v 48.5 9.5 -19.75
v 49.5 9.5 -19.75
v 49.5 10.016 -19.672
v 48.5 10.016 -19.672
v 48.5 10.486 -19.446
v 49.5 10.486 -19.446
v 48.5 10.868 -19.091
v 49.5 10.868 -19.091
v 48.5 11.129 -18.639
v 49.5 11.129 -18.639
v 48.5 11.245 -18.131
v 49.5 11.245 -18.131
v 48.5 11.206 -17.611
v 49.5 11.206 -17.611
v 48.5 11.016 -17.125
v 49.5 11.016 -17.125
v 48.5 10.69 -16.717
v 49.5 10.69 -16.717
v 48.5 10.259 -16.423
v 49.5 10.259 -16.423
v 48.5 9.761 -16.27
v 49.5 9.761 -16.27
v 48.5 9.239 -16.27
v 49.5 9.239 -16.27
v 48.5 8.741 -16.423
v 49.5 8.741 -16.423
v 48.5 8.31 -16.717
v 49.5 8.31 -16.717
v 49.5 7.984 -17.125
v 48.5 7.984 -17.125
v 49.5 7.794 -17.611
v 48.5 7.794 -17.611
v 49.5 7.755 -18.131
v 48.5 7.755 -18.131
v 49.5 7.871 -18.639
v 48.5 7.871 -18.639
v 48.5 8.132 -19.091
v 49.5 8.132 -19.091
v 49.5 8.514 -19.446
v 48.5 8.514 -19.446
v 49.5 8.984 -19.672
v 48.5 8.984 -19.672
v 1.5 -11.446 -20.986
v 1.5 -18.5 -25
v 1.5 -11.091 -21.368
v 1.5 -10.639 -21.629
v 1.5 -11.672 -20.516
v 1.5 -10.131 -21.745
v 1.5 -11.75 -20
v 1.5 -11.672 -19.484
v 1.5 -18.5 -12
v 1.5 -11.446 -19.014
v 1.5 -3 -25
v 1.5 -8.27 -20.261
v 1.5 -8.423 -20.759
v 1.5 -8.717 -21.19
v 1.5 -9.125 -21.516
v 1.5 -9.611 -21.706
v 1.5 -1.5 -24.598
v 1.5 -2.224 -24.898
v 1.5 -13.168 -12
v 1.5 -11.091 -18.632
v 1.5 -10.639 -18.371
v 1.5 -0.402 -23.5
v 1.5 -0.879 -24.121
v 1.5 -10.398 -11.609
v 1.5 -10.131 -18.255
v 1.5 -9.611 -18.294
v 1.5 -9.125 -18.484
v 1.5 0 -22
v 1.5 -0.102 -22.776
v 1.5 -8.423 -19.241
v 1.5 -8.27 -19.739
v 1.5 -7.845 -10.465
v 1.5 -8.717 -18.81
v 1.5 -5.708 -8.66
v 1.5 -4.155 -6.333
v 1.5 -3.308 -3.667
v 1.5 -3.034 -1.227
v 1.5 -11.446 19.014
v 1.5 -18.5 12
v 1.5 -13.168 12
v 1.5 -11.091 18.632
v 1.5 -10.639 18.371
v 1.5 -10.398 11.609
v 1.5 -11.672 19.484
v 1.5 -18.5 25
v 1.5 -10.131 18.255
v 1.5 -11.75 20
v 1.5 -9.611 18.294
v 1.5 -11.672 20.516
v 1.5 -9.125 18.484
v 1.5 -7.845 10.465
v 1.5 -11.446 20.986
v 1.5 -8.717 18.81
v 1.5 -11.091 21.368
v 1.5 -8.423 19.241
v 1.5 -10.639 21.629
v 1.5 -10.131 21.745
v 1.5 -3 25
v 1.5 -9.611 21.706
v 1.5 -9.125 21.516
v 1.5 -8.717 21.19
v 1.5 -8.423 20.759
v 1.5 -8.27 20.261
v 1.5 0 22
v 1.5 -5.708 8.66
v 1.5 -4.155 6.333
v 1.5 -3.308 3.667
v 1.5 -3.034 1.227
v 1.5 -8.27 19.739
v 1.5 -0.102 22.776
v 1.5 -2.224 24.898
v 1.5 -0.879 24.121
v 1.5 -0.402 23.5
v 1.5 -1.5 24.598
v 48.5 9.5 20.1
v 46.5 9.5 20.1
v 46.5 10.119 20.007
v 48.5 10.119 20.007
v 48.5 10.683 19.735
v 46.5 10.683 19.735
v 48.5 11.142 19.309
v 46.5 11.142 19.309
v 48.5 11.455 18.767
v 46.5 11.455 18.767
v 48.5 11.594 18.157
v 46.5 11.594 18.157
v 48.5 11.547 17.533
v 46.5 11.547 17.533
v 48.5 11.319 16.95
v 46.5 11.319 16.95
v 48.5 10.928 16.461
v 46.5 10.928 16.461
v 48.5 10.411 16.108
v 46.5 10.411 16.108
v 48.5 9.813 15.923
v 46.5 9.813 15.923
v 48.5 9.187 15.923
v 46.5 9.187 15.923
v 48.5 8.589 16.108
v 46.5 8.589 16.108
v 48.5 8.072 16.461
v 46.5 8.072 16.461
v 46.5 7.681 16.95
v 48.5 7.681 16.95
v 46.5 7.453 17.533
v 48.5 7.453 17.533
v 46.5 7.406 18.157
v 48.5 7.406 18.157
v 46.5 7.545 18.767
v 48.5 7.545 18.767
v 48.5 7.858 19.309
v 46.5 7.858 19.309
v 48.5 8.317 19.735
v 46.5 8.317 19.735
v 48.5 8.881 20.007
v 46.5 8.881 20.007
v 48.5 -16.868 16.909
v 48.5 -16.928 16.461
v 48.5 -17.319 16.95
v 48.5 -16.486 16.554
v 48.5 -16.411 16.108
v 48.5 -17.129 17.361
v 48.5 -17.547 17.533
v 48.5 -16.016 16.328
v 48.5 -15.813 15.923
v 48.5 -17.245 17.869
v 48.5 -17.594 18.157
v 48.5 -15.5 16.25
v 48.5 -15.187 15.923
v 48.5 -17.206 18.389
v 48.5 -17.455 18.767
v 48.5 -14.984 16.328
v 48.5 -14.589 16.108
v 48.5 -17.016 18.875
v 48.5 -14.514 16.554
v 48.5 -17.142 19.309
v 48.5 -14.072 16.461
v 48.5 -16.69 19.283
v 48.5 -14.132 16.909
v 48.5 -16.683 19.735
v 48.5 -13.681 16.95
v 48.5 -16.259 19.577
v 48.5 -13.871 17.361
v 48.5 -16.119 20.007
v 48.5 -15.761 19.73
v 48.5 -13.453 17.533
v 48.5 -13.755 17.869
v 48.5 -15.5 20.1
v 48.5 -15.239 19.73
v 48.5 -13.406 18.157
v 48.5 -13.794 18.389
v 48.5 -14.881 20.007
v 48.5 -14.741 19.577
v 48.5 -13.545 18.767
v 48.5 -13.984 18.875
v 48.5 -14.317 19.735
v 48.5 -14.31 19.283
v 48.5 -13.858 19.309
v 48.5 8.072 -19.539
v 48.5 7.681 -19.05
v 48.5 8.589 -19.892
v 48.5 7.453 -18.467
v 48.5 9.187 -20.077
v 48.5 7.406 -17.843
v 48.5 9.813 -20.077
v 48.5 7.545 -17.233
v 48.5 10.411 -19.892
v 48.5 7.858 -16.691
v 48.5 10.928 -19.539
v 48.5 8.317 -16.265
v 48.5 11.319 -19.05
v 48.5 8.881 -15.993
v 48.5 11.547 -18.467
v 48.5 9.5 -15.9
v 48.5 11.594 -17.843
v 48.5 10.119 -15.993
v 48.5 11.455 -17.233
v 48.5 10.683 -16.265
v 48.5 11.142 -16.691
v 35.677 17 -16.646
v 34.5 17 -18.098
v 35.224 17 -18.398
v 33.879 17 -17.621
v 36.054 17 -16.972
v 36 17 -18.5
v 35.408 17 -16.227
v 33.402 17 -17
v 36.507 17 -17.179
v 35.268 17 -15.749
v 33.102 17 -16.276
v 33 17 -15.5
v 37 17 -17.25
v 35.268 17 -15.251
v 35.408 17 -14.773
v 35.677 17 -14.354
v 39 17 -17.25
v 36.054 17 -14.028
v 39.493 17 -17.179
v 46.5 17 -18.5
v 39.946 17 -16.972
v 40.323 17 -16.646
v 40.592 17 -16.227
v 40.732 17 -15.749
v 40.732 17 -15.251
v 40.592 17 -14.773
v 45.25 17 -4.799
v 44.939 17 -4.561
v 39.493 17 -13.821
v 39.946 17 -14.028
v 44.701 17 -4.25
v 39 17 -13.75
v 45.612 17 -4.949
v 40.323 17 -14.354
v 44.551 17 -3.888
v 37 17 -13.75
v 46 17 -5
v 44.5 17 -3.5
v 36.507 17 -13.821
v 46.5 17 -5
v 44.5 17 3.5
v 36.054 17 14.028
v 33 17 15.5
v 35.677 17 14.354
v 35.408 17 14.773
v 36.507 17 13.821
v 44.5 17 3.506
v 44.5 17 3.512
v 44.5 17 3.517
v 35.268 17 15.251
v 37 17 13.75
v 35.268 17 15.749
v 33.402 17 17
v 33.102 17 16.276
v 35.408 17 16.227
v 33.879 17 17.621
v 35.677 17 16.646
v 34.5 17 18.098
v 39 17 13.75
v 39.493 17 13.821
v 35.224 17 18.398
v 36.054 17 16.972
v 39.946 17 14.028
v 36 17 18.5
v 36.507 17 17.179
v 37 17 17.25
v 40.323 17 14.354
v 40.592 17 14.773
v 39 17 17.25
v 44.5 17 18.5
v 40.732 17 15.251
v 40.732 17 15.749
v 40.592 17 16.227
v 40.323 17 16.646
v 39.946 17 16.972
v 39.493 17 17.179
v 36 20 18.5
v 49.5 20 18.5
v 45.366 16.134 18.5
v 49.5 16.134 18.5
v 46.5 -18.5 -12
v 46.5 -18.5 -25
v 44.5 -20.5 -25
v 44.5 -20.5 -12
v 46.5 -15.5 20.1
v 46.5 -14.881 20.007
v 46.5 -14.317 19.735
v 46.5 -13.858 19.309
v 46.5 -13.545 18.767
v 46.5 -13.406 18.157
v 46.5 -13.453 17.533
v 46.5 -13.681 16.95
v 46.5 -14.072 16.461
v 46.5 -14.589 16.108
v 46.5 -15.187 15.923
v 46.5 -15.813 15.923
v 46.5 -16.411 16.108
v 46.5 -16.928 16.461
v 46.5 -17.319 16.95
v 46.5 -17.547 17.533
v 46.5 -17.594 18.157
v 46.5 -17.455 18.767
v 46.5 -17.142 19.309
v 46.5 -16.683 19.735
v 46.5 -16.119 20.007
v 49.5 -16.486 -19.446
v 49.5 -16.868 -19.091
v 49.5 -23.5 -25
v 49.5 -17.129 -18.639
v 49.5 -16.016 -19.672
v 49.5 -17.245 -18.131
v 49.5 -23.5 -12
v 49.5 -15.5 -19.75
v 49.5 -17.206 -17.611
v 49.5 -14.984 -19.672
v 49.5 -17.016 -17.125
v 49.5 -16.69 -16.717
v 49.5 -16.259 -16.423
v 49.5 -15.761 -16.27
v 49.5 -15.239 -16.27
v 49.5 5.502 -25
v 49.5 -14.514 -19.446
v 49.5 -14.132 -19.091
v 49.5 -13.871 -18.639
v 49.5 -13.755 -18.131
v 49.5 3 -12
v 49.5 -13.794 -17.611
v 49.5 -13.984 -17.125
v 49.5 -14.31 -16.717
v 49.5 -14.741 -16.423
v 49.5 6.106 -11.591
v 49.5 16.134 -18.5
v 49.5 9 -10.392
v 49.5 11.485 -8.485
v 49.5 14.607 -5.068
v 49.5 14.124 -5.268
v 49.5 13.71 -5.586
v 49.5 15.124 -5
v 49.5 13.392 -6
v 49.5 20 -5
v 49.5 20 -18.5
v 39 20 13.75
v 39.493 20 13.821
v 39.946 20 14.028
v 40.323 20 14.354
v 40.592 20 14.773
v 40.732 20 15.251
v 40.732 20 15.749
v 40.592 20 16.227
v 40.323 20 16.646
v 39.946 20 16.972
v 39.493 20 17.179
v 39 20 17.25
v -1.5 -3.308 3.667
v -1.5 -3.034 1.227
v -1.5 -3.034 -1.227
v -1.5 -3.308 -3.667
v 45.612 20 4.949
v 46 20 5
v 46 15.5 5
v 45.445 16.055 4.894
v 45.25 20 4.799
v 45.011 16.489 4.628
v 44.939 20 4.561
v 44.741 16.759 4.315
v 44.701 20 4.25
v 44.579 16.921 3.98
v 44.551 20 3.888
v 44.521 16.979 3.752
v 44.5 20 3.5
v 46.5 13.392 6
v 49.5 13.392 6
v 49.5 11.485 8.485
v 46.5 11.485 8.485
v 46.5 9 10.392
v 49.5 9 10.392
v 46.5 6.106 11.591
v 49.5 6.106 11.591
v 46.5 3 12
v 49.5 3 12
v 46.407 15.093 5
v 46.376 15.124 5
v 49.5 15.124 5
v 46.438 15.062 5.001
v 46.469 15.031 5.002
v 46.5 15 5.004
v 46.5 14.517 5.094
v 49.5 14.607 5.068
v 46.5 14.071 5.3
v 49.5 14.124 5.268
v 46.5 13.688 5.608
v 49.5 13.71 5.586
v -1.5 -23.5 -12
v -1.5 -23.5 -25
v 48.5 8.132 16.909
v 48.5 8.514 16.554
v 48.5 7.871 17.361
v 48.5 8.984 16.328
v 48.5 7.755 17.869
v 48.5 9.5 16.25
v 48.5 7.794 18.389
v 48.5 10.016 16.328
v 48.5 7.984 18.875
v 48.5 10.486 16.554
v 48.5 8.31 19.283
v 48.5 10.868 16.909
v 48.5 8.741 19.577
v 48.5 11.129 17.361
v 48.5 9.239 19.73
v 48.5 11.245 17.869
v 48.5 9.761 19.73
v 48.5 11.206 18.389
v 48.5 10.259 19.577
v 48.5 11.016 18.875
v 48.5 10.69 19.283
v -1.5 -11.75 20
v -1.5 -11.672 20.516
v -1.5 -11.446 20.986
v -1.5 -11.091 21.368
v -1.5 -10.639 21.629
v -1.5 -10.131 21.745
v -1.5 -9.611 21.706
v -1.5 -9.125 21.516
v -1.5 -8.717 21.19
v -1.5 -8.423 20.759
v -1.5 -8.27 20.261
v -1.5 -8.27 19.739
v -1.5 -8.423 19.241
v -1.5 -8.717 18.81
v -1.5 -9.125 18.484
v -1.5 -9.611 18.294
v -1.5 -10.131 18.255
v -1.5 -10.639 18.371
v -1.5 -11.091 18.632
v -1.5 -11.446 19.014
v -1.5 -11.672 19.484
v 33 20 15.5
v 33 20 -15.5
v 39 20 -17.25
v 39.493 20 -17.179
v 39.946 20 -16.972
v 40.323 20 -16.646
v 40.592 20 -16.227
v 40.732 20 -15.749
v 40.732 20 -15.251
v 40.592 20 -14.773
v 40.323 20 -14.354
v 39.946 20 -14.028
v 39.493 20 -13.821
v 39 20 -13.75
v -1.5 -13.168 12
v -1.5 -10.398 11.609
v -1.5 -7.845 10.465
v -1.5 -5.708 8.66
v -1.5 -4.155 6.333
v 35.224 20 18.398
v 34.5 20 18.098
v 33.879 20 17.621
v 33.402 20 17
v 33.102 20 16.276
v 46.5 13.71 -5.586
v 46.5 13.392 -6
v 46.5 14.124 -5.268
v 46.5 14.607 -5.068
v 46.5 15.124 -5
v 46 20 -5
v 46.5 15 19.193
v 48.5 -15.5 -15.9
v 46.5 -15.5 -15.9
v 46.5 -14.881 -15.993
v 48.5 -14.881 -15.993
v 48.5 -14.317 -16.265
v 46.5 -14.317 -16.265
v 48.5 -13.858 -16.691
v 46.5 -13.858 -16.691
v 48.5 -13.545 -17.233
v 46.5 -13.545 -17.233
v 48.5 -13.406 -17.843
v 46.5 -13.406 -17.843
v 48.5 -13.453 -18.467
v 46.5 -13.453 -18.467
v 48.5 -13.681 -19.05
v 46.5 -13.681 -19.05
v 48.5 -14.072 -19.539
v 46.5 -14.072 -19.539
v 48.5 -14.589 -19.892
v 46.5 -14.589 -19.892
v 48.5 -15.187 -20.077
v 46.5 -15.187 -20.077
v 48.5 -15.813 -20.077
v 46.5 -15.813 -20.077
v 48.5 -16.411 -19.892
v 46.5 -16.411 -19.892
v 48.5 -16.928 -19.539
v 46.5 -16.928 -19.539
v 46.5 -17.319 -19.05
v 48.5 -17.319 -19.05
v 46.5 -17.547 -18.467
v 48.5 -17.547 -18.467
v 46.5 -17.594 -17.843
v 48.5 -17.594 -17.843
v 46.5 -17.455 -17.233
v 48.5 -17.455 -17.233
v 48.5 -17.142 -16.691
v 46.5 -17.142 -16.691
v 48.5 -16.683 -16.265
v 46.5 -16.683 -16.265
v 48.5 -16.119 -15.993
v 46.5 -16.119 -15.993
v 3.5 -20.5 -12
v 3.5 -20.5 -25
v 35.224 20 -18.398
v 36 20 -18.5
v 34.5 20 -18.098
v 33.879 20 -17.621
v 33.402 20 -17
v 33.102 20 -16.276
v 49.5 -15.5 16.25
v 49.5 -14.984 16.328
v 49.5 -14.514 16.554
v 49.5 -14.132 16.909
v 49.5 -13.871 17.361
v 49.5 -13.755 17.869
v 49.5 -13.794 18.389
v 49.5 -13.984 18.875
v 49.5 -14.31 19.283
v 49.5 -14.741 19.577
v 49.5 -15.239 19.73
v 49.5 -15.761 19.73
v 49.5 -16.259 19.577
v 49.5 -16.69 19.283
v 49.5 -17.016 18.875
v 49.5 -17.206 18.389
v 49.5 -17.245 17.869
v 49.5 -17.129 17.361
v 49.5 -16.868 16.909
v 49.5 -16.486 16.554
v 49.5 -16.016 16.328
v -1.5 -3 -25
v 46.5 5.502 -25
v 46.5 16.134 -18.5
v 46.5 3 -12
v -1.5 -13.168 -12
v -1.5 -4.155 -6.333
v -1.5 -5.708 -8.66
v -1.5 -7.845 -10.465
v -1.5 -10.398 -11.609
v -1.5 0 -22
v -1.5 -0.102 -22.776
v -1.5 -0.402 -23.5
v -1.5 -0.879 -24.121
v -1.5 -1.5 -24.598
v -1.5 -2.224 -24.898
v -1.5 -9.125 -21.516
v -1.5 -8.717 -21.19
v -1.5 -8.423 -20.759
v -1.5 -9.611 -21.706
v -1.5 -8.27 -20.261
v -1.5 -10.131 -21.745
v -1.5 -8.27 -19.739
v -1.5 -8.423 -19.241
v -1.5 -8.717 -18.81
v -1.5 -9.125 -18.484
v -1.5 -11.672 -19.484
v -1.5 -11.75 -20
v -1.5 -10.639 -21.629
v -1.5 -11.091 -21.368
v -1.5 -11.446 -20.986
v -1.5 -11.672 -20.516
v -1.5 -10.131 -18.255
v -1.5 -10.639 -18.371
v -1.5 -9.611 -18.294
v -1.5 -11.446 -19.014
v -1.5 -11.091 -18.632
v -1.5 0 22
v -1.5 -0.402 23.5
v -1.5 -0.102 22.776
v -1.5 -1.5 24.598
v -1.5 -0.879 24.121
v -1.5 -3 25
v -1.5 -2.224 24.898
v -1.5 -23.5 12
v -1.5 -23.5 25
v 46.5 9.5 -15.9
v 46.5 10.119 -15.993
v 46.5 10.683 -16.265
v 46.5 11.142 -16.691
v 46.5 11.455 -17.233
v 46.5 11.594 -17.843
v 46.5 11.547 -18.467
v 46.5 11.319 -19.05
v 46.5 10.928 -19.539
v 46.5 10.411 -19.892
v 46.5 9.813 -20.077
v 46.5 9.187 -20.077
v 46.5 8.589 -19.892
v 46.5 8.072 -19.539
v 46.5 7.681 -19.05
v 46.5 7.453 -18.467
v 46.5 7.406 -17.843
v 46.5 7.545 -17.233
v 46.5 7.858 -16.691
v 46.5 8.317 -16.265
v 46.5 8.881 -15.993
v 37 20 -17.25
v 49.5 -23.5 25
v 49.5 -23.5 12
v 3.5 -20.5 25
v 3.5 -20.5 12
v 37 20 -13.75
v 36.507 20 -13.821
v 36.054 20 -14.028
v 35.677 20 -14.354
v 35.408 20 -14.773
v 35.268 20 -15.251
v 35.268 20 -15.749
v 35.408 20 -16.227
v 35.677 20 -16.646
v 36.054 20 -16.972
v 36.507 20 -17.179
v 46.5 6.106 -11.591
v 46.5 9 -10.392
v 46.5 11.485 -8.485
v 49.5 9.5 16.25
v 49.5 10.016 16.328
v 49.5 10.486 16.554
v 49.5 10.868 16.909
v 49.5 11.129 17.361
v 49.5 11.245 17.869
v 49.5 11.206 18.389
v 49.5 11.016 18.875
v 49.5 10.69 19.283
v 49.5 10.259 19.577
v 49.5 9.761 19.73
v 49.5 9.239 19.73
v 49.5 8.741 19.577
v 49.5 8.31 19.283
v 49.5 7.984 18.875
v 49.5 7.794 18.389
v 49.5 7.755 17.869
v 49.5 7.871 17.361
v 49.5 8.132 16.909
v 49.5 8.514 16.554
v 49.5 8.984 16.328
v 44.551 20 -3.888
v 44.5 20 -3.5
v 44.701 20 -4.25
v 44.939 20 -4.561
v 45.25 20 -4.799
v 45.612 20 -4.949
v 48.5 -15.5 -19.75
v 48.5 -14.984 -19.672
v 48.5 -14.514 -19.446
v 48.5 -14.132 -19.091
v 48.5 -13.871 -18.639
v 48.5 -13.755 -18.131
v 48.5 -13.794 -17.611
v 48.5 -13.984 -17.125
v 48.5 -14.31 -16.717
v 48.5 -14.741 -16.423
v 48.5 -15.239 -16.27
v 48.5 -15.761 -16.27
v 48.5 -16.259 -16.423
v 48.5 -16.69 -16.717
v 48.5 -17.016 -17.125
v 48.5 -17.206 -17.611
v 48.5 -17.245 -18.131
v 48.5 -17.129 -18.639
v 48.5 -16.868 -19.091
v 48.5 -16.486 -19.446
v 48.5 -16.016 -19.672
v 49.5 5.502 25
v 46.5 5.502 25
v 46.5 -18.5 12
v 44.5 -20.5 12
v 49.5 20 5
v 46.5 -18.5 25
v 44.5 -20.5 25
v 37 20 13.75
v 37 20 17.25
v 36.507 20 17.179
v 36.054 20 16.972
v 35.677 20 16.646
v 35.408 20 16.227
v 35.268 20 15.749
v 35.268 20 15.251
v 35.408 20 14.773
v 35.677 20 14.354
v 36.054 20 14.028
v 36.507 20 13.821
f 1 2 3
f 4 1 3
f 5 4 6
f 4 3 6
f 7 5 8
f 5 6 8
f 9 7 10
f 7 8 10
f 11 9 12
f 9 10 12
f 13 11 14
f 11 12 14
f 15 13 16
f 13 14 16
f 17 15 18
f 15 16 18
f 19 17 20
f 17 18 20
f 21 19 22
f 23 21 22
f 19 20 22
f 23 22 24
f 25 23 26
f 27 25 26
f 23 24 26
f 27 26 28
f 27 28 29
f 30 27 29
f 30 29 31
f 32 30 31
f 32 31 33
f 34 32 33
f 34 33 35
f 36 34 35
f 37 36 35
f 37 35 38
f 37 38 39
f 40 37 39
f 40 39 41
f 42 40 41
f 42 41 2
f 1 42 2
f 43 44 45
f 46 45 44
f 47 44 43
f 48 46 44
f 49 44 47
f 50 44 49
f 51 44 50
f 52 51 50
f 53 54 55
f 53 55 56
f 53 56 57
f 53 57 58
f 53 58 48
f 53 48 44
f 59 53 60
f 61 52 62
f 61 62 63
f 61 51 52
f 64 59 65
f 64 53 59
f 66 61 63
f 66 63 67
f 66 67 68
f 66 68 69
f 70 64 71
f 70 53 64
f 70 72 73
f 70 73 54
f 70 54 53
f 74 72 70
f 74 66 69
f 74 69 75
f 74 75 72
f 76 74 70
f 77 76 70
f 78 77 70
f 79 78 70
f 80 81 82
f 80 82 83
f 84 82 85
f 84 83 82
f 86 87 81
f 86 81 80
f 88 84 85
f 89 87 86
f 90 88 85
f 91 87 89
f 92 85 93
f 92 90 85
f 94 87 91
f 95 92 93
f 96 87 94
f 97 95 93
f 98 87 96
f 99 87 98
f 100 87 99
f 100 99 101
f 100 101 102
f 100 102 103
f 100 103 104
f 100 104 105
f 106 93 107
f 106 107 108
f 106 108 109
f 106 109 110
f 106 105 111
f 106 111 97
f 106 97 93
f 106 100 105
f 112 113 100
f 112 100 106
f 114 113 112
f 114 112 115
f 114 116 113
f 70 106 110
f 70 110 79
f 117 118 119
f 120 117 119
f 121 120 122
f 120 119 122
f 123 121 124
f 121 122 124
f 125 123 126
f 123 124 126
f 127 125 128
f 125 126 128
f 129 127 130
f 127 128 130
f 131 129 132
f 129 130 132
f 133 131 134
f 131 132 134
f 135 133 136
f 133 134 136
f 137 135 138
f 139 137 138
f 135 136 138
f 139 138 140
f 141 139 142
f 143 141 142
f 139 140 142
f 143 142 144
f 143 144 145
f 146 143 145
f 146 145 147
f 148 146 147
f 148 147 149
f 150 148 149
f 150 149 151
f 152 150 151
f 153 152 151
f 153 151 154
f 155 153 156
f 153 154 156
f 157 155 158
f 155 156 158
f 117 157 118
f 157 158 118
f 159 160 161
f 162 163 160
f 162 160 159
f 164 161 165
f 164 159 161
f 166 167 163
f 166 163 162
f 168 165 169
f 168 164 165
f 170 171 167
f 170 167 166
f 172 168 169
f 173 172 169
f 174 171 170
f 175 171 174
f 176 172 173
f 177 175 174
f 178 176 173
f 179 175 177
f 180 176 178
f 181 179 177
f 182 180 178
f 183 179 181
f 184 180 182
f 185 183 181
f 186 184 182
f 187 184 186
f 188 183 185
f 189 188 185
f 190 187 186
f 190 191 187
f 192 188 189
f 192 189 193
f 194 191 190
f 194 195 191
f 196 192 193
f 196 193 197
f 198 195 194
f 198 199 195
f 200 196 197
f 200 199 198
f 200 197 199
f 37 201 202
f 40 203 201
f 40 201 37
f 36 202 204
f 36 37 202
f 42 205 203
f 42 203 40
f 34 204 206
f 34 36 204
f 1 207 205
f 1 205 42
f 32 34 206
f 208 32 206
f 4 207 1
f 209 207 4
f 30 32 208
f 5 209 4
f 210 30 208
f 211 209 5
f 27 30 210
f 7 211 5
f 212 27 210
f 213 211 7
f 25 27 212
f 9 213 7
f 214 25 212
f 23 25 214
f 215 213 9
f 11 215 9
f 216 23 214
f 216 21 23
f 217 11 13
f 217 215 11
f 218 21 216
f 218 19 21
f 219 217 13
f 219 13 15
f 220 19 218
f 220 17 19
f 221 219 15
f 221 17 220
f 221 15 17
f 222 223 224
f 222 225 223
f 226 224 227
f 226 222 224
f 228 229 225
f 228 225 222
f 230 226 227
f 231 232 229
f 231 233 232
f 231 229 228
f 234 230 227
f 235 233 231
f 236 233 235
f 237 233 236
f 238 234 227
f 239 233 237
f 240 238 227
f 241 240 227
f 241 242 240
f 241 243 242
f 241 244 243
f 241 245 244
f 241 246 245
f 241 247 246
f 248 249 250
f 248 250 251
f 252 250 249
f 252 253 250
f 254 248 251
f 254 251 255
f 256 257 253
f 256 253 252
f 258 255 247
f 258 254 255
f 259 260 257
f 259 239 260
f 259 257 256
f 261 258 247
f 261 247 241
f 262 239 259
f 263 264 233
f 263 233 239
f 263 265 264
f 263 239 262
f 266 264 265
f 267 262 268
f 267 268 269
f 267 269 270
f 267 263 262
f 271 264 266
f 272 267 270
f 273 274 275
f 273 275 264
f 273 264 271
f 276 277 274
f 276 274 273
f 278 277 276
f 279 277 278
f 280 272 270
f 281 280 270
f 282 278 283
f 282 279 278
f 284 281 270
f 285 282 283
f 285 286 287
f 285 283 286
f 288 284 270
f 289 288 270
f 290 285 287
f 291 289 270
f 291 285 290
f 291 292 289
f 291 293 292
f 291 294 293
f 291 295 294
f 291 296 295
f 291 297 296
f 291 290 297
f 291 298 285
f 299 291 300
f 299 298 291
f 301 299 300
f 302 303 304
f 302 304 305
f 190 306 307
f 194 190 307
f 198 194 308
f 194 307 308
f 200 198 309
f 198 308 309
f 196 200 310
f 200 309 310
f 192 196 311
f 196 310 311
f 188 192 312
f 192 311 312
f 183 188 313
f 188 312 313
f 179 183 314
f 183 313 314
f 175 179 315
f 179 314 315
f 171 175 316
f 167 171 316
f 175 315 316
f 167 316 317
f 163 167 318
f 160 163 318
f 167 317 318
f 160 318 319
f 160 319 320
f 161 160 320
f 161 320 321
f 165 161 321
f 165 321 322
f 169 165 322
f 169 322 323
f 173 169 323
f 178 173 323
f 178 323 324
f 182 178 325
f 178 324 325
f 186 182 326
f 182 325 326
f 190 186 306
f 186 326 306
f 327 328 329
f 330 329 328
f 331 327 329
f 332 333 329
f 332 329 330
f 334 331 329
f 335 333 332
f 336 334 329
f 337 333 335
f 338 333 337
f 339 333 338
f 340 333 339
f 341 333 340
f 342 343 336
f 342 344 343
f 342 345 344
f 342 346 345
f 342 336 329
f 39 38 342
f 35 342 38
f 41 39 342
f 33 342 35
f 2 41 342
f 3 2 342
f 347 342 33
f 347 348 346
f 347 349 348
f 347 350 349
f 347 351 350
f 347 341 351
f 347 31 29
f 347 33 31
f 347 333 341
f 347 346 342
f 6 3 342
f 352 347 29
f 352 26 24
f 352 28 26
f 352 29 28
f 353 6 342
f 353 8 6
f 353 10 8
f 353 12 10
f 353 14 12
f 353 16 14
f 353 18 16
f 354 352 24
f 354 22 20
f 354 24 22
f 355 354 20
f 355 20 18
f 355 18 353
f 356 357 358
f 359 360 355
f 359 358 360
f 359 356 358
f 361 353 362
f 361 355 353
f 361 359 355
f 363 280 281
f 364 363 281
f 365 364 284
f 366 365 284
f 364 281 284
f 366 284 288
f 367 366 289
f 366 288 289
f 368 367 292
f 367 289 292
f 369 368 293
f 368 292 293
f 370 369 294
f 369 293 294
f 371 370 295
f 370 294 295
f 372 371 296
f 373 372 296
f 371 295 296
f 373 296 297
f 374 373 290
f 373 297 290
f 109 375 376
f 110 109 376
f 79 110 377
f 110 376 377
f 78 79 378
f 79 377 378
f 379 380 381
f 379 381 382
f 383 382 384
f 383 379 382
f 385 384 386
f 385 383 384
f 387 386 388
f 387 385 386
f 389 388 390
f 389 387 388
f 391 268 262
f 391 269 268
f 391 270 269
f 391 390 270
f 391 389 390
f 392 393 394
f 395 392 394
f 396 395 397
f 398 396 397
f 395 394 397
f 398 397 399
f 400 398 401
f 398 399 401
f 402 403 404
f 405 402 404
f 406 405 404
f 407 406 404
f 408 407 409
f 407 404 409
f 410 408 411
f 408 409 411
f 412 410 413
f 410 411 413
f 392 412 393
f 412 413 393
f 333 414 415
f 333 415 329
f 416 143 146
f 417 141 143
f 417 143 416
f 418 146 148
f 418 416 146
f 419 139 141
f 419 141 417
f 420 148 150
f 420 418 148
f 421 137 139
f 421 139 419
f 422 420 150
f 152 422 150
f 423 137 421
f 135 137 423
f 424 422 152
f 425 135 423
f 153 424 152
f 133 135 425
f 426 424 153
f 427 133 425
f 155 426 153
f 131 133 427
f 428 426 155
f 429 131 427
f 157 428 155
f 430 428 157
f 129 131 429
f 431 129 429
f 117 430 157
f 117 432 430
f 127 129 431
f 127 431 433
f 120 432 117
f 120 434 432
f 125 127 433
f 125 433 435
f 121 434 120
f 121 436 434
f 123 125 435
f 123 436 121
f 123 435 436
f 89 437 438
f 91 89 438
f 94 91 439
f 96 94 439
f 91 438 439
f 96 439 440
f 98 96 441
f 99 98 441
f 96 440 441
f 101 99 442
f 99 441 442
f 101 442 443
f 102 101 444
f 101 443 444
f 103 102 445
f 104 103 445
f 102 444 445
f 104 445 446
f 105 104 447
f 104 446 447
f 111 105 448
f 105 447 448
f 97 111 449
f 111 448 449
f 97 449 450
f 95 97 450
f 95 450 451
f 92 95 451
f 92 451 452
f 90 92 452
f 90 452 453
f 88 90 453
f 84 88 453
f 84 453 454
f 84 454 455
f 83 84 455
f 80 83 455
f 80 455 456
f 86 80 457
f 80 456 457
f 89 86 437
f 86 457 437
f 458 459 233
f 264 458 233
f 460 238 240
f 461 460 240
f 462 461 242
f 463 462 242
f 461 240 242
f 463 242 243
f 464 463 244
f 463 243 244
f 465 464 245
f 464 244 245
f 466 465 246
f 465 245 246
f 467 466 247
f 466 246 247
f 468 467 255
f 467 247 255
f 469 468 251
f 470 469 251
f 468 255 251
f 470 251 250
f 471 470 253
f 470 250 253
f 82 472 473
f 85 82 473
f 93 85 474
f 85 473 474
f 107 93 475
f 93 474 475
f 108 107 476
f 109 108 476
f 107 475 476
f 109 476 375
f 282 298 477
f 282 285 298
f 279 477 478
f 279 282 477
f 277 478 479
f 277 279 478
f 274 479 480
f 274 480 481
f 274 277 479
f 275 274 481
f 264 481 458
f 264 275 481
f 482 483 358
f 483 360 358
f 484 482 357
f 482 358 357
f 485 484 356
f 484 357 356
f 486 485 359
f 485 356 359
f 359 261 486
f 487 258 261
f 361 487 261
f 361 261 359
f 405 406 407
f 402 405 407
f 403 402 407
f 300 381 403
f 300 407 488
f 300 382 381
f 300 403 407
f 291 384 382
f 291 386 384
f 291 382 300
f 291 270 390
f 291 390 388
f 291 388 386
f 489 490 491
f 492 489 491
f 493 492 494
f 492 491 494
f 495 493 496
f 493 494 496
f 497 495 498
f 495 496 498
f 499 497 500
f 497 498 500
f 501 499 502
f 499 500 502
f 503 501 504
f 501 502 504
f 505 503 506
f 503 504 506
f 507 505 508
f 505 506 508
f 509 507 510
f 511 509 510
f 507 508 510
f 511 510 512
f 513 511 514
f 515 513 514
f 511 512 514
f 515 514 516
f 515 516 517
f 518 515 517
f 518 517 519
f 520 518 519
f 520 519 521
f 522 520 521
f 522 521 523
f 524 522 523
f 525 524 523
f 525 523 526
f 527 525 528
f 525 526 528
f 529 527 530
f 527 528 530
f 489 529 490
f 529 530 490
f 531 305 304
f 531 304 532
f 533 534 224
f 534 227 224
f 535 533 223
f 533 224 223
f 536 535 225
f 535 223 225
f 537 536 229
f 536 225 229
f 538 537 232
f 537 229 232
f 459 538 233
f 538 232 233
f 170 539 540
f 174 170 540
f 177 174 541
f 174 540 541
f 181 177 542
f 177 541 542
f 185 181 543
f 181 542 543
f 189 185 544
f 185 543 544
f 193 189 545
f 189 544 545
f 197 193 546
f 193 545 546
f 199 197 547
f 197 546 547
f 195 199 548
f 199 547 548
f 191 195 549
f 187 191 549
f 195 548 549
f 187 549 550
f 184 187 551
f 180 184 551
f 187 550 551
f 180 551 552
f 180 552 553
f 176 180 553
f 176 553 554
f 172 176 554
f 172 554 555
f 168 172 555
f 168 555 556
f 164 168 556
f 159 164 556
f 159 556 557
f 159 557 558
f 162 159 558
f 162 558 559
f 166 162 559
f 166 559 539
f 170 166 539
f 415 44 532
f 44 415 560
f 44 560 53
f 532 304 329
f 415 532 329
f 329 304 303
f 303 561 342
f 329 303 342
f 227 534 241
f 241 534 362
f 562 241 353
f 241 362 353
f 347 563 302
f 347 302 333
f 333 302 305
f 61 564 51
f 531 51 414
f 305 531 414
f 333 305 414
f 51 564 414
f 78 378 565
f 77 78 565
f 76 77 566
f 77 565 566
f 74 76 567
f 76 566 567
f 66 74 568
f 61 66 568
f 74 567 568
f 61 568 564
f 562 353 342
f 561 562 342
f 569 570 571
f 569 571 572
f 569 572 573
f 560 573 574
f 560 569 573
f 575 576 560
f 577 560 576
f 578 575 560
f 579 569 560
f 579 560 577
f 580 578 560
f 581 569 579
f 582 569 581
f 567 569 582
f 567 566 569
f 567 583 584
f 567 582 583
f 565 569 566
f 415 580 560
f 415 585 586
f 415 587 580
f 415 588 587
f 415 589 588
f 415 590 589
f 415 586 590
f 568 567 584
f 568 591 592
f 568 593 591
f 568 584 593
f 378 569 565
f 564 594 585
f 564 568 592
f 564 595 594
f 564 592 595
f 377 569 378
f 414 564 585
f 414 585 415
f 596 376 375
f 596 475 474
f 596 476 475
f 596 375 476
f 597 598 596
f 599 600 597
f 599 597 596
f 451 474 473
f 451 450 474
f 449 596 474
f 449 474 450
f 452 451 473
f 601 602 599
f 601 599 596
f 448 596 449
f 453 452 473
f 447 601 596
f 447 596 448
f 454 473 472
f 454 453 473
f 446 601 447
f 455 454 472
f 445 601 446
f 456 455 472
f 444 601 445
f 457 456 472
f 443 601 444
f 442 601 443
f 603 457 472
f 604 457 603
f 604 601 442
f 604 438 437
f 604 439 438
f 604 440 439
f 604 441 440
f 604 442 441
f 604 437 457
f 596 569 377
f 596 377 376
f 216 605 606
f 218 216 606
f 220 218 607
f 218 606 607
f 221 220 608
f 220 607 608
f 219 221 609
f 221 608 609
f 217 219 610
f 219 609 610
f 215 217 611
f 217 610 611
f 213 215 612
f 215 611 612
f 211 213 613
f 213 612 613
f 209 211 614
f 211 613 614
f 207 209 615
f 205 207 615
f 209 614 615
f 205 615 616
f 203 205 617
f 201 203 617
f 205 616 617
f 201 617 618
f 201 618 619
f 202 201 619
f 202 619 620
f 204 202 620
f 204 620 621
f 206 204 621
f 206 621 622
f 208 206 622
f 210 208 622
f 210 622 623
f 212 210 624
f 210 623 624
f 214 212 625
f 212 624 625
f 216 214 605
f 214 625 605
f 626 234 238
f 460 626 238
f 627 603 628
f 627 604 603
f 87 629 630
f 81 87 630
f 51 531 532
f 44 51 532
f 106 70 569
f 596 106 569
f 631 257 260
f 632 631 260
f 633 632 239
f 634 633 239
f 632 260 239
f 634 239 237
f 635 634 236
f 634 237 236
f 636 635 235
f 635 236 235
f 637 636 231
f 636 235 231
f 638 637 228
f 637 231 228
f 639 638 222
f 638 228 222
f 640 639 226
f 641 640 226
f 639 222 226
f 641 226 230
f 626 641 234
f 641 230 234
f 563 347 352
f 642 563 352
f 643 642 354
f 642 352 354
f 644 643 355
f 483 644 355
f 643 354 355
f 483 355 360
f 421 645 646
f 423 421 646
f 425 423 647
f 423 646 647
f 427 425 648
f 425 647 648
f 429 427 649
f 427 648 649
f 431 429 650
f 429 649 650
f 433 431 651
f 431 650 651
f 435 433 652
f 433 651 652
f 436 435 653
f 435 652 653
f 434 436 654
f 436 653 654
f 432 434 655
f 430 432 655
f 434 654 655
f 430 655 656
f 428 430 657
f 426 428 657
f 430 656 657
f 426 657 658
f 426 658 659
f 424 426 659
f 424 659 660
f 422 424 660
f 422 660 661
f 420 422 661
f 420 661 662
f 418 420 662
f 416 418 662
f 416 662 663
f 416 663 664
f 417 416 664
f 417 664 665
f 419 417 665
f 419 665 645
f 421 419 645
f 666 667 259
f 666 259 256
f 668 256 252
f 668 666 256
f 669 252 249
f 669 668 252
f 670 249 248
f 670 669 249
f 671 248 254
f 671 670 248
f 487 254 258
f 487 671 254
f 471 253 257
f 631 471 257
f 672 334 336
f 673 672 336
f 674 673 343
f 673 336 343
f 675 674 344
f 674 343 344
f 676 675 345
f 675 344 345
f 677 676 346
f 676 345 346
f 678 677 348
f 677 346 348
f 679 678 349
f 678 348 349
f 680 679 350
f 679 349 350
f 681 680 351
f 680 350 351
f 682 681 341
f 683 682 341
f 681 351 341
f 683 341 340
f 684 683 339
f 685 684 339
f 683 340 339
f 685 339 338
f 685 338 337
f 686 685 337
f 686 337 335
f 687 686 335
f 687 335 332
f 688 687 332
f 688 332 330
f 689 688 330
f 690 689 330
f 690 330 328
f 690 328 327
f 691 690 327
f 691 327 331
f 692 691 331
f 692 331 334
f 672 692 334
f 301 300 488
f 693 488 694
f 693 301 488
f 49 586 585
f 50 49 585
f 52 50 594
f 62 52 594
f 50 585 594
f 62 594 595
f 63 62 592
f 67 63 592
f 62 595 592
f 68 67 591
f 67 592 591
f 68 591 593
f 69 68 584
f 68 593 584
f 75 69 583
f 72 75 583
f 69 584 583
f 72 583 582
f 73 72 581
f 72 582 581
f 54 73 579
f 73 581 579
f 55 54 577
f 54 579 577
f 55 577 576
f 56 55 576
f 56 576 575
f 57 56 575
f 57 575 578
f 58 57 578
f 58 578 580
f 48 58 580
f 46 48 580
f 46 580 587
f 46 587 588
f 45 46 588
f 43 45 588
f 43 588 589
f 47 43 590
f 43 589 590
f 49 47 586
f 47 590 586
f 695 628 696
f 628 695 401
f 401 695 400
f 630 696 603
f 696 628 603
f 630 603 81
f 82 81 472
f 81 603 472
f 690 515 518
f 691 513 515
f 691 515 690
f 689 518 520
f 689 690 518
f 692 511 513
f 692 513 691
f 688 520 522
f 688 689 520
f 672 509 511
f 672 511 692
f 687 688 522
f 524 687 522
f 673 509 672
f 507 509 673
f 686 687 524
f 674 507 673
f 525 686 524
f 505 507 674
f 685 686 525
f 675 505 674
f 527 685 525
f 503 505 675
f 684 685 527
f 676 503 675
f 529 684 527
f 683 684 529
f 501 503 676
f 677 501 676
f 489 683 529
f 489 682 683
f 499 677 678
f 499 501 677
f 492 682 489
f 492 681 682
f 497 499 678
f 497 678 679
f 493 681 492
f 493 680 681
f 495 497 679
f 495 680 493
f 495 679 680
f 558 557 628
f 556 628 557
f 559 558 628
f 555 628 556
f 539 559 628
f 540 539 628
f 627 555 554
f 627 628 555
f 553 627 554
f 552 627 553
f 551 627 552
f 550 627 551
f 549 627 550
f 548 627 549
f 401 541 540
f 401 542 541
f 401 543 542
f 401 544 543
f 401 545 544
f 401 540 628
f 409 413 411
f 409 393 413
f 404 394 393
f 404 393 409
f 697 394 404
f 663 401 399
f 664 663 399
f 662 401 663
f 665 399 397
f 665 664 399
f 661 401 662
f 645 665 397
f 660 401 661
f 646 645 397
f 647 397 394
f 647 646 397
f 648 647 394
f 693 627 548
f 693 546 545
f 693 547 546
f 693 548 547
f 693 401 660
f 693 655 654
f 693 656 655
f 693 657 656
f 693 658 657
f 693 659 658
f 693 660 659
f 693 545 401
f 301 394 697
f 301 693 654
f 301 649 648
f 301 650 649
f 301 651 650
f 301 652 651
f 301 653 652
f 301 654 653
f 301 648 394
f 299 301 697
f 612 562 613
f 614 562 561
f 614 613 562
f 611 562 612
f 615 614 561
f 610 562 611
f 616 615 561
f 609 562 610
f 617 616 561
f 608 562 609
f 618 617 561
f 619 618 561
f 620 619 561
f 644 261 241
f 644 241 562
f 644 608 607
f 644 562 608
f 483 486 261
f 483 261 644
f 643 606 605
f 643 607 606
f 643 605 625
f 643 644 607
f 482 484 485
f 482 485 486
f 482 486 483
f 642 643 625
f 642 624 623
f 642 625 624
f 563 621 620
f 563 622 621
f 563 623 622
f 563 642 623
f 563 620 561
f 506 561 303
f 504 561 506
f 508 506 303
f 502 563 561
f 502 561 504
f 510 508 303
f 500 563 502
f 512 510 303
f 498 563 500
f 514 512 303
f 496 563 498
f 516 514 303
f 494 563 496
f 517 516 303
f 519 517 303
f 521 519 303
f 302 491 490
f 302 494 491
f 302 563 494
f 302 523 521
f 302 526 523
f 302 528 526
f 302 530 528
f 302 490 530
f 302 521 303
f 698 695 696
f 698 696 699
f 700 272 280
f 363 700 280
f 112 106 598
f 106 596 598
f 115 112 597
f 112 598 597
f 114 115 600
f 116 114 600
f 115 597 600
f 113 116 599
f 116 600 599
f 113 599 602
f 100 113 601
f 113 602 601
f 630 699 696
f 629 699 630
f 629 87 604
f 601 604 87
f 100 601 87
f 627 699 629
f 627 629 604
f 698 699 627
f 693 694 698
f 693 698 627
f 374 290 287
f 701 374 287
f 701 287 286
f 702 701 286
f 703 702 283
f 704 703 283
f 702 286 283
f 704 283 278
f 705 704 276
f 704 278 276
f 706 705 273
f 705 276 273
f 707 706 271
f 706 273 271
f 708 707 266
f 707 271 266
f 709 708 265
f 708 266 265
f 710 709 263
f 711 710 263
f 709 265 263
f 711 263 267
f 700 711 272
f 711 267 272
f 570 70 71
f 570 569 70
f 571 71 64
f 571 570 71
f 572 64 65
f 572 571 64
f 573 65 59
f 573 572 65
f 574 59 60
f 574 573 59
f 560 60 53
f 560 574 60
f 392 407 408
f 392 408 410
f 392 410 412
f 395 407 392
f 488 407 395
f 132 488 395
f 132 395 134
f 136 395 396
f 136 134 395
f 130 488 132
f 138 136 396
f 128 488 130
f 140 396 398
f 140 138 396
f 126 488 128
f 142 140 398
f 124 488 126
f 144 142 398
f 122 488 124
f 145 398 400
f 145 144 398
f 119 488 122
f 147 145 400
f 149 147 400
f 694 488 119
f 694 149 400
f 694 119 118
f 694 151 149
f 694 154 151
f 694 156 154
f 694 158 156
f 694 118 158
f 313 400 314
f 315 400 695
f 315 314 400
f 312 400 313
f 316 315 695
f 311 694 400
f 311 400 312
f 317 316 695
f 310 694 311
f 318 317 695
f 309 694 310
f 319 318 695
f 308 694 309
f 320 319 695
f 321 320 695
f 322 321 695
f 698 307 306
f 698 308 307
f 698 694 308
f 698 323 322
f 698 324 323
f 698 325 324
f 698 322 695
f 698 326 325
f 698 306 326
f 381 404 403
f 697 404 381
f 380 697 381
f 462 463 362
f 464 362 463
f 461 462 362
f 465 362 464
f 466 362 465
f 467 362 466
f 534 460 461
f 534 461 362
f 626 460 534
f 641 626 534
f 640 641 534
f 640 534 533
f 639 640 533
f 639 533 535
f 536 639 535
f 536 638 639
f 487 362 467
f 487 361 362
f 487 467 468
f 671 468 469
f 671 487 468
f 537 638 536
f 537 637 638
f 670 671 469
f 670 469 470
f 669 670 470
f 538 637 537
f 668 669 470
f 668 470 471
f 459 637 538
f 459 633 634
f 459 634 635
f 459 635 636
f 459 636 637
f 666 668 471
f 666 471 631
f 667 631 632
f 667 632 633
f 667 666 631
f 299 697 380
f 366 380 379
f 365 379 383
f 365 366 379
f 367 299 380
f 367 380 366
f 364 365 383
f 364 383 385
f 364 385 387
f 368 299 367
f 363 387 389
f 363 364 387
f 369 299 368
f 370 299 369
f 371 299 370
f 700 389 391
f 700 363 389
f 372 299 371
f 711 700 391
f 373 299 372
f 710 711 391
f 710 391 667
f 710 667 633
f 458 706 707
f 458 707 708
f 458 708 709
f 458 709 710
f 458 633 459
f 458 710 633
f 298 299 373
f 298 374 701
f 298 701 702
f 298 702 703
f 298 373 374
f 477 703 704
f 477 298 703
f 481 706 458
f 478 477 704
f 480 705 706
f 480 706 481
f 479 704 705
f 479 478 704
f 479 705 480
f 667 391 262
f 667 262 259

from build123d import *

# Parameters (mm, degrees)
EXTRUDE_THIN1_DEPTH = 25
SKETCH2_R           = 1.75
CUT_EXTRUDE1_DEPTH  = 3
CUT_EXTRUDE2_REACH  = 63.467
CUT_EXTRUDE3_REACH  = 63.467
CUT_EXTRUDE4_DEPTH  = 3
CUT_EXTRUDE5_REACH  = 72.48
SKETCH7_R           = 1.75
FILLET1_R           = 3
CUT_EXTRUDE7_REACH  = 63.467
SKETCH9_R           = 1.75
CUT_EXTRUDE8_START  = -3
CUT_EXTRUDE8_DEPTH  = 3
SKETCH11_R          = 2.1
CUT_EXTRUDE10_DEPTH = 2
CUT_EXTRUDE11_DEPTH = 10
CHAMFER1_SIZE       = 2
FILLET2_R           = 2


with BuildPart() as part:
    # Sketch1 → Extrude-Thin1 (new, symmetric)
    with BuildSketch(Plane.XY):
        Polygon((-1.5, 0), (-1.5, -23.5), (49.5, -23.5), (49.5, 20), (33, 20), (33, 17), (46.5, 17), (46.5, -20.5), (1.5, -20.5), (1.5, 0), align=None)
    extrude(amount=EXTRUDE_THIN1_DEPTH, both=True)

    # Sketch2 → Cut-Extrude1 (cut)
    with BuildSketch(Plane.ZY.offset(1.5)):
        with Locations(Location((-20, -10, 0), (0, 0, 270))):
            Circle(SKETCH2_R)
        with Locations(Location((20, -10, 0), (0, 0, 270))):
            Circle(SKETCH2_R)
    extrude(amount=-CUT_EXTRUDE1_DEPTH, mode=Mode.SUBTRACT)

    # Cut-Extrude2: up to this face of the body (flat: up to its plane)
    cut_extrude2_end = Plane(part.part.faces().sort_by_distance((46.5, -1.75, 0))[0])
    # Sketch3 → Cut-Extrude2 (cut, up to the picked face)
    with BuildSketch(Plane.ZY.offset(1.5), mode=Mode.PRIVATE) as cut_extrude2_sk1:
        with BuildLine():
            Line((-12, -13.167840434), (-12, -27.818696))
            Line((-12, -27.818696), (12, -27.818696))
            Line((12, -27.818696), (12, -13.167840434))
            ThreePointArc((12, -13.167840434), (9.637626158, -6.71286819), (3.666666667, -3.307707462))
            ThreePointArc((3.666666667, -3.307707462), (0, -3), (-3.666666667, -3.307707462))
            ThreePointArc((-3.666666667, -3.307707462), (-9.637626158, -6.71286819), (-12, -13.167840434))
        make_face()
    cut_extrude2_tool1 = split(extrude(cut_extrude2_sk1.sketch, amount=-CUT_EXTRUDE2_REACH, mode=Mode.PRIVATE), bisect_by=cut_extrude2_end, keep=Keep.BOTH, mode=Mode.PRIVATE)
    add(cut_extrude2_tool1.solids().sort_by(Axis((-1.5, -16.267413, 0), (1, 0, 0)))[0], mode=Mode.SUBTRACT)

    # Sketch5 → Cut-Extrude3 (cut, up to next)
    with BuildSketch(Plane(origin=(49.5, 0, 0), x_dir=(0, 0, -1), z_dir=(1, 0, 0)), mode=Mode.PRIVATE) as cut_extrude3_sk1:
        Polygon((-18.5, 20), (-18.5, 16.133851182), (-25, 5.502473915), (-25, 20), align=None)
    cut_extrude3_tool1 = extrude(cut_extrude3_sk1.sketch, amount=-CUT_EXTRUDE3_REACH, mode=Mode.PRIVATE) & part.part
    cut_extrude3 = cut_extrude3_tool1.solids().sort_by_distance((49.5, 14.896175, 22.37718))[0]
    add(cut_extrude3, mode=Mode.SUBTRACT)

    # Mirror1: Cut-Extrude3 across plane
    add(cut_extrude3.mirror(Plane.XY), mode=Mode.SUBTRACT)

    # Sketch6 → Cut-Extrude4 (cut)
    with BuildSketch(Plane(origin=(49.5, 0, 0), x_dir=(0, 0, -1), z_dir=(1, 0, 0))):
        with BuildLine():
            Line((-12, -23.5), (12, -23.5))
            Line((12, -23.5), (12, 3))
            ThreePointArc((12, 3), (0, 15), (-12, 3))
            Line((-12, 3), (-12, -23.5))
        make_face()
    extrude(amount=-CUT_EXTRUDE4_DEPTH, mode=Mode.SUBTRACT)

    # Sketch7 → Cut-Extrude5 (cut, up to next)
    with BuildSketch(Plane(origin=(0, 20, 0), x_dir=(1, 0, 0), z_dir=(0, 1, 0)), mode=Mode.PRIVATE) as cut_extrude5_sk1:
        with Locations(Location((38, 15.5, 0), (0, 0, 180))):
            Circle(SKETCH7_R)
    cut_extrude5_tool1 = extrude(cut_extrude5_sk1.sketch, amount=-CUT_EXTRUDE5_REACH, mode=Mode.PRIVATE) & part.part
    # Sketch7 → Cut-Extrude5 (cut, up to next)
    with BuildSketch(Plane(origin=(0, 20, 0), x_dir=(1, 0, 0), z_dir=(0, 1, 0)), mode=Mode.PRIVATE) as cut_extrude5_sk2:
        with Locations(Location((38, -15.5, 0), (0, 0, 180))):
            Circle(SKETCH7_R)
    cut_extrude5_tool2 = extrude(cut_extrude5_sk2.sketch, amount=-CUT_EXTRUDE5_REACH, mode=Mode.PRIVATE) & part.part
    add(cut_extrude5_tool1.solids().sort_by_distance((38, 20, -15.5))[0], mode=Mode.SUBTRACT)
    add(cut_extrude5_tool2.solids().sort_by_distance((38, 20, 15.5))[0], mode=Mode.SUBTRACT)

    # Fillet1
    fillet1_edges = [part.edges().sort_by_distance(p)[0] for p in [
        (0, 0, 25),
        (33, 18.5, 18.5),
        (0, 0, -25),
        (33, 18.5, -18.5),
    ]]
    fillet(fillet1_edges, radius=FILLET1_R)

    # Sketch9 → Cut-Extrude7 (cut, up to next)
    with BuildSketch(Plane(origin=(49.5, 0, 0), x_dir=(0, 0, -1), z_dir=(1, 0, 0)), mode=Mode.PRIVATE) as cut_extrude7_sk1:
        with Locations((-18, -15.5)):
            Circle(SKETCH9_R)
    cut_extrude7_tool1 = extrude(cut_extrude7_sk1.sketch, amount=-CUT_EXTRUDE7_REACH, mode=Mode.PRIVATE) & part.part
    # Sketch9 → Cut-Extrude7 (cut, up to next)
    with BuildSketch(Plane(origin=(49.5, 0, 0), x_dir=(0, 0, -1), z_dir=(1, 0, 0)), mode=Mode.PRIVATE) as cut_extrude7_sk2:
        with Locations((18, -15.5)):
            Circle(SKETCH9_R)
    cut_extrude7_tool2 = extrude(cut_extrude7_sk2.sketch, amount=-CUT_EXTRUDE7_REACH, mode=Mode.PRIVATE) & part.part
    # Sketch9 → Cut-Extrude7 (cut, up to next)
    with BuildSketch(Plane(origin=(49.5, 0, 0), x_dir=(0, 0, -1), z_dir=(1, 0, 0)), mode=Mode.PRIVATE) as cut_extrude7_sk3:
        with Locations((-18, 9.5)):
            Circle(SKETCH9_R)
    cut_extrude7_tool3 = extrude(cut_extrude7_sk3.sketch, amount=-CUT_EXTRUDE7_REACH, mode=Mode.PRIVATE) & part.part
    # Sketch9 → Cut-Extrude7 (cut, up to next)
    with BuildSketch(Plane(origin=(49.5, 0, 0), x_dir=(0, 0, -1), z_dir=(1, 0, 0)), mode=Mode.PRIVATE) as cut_extrude7_sk4:
        with Locations((18, 9.5)):
            Circle(SKETCH9_R)
    cut_extrude7_tool4 = extrude(cut_extrude7_sk4.sketch, amount=-CUT_EXTRUDE7_REACH, mode=Mode.PRIVATE) & part.part
    add(cut_extrude7_tool1.solids().sort_by_distance((49.5, -15.5, 18))[0], mode=Mode.SUBTRACT)
    add(cut_extrude7_tool2.solids().sort_by_distance((49.5, -15.5, -18))[0], mode=Mode.SUBTRACT)
    add(cut_extrude7_tool3.solids().sort_by_distance((49.5, 9.5, 18))[0], mode=Mode.SUBTRACT)
    add(cut_extrude7_tool4.solids().sort_by_distance((49.5, 9.5, -18))[0], mode=Mode.SUBTRACT)

    # Sketch10 → Cut-Extrude8 (cut)
    with BuildSketch(Plane(origin=(0, 20, 0), x_dir=(1, 0, 0), z_dir=(0, 1, 0)).offset(CUT_EXTRUDE8_START)):
        with BuildLine():
            Line((37, 17.25), (39, 17.25))
            ThreePointArc((39, 17.25), (40.75, 15.5), (39, 13.75))
            Line((39, 13.75), (37, 13.75))
            ThreePointArc((37, 13.75), (35.25, 15.5), (37, 17.25))
        make_face()
        with BuildLine():
            Line((37, -13.75), (39, -13.75))
            ThreePointArc((39, -13.75), (40.75, -15.5), (39, -17.25))
            Line((39, -17.25), (37, -17.25))
            ThreePointArc((37, -17.25), (35.25, -15.5), (37, -13.75))
        make_face()
    extrude(amount=CUT_EXTRUDE8_DEPTH, mode=Mode.SUBTRACT)

    # Sketch11 → Cut-Extrude10 (cut)
    with BuildSketch(Plane.ZY.offset(-46.5)):
        with Locations((-18, 9.5)):
            Circle(SKETCH11_R)
        with Locations((18, 9.5)):
            Circle(SKETCH11_R)
        with Locations((18, -15.5)):
            Circle(SKETCH11_R)
        with Locations((-18, -15.5)):
            Circle(SKETCH11_R)
    extrude(amount=-CUT_EXTRUDE10_DEPTH, mode=Mode.SUBTRACT)

    # Sketch12 → Cut-Extrude11 (cut)
    with BuildSketch(Plane(origin=(0, 20, 0), x_dir=(1, 0, 0), z_dir=(0, 1, 0))):
        with BuildLine():
            Line((49.5, -5), (46, -5))
            ThreePointArc((46, -5), (44.939339828, -4.560660172), (44.5, -3.5))
            Line((44.5, -3.5), (44.5, 3.5))
            ThreePointArc((44.5, 3.5), (44.939339828, 4.560660172), (46, 5))
            Line((46, 5), (49.5, 5))
            Line((49.5, 5), (49.5, -5))
        make_face()
    extrude(amount=-CUT_EXTRUDE11_DEPTH, mode=Mode.SUBTRACT)

    # Chamfer1
    chamfer1_edges = [part.edges().sort_by_distance(p)[0] for p in [
        (46.5, 17, 11.75),
        (1.5, -20.5, -18.5),
        (1.5, -20.5, 18.5),
        (46.5, -20.5, 18.5),
        (46.5, -20.5, -18.5),
    ]]
    chamfer(chamfer1_edges, length=CHAMFER1_SIZE - 0.0001)  # a hair under: the kernel refuses the full size

    # Fillet2
    fillet2_edges = [part.edges().sort_by_distance(p)[0] for p in [
        (48, 13.908712115, -5),
        (48, 13.908712115, 5),
    ]]
    fillet(fillet2_edges, radius=FILLET2_R)


solid = part.part
